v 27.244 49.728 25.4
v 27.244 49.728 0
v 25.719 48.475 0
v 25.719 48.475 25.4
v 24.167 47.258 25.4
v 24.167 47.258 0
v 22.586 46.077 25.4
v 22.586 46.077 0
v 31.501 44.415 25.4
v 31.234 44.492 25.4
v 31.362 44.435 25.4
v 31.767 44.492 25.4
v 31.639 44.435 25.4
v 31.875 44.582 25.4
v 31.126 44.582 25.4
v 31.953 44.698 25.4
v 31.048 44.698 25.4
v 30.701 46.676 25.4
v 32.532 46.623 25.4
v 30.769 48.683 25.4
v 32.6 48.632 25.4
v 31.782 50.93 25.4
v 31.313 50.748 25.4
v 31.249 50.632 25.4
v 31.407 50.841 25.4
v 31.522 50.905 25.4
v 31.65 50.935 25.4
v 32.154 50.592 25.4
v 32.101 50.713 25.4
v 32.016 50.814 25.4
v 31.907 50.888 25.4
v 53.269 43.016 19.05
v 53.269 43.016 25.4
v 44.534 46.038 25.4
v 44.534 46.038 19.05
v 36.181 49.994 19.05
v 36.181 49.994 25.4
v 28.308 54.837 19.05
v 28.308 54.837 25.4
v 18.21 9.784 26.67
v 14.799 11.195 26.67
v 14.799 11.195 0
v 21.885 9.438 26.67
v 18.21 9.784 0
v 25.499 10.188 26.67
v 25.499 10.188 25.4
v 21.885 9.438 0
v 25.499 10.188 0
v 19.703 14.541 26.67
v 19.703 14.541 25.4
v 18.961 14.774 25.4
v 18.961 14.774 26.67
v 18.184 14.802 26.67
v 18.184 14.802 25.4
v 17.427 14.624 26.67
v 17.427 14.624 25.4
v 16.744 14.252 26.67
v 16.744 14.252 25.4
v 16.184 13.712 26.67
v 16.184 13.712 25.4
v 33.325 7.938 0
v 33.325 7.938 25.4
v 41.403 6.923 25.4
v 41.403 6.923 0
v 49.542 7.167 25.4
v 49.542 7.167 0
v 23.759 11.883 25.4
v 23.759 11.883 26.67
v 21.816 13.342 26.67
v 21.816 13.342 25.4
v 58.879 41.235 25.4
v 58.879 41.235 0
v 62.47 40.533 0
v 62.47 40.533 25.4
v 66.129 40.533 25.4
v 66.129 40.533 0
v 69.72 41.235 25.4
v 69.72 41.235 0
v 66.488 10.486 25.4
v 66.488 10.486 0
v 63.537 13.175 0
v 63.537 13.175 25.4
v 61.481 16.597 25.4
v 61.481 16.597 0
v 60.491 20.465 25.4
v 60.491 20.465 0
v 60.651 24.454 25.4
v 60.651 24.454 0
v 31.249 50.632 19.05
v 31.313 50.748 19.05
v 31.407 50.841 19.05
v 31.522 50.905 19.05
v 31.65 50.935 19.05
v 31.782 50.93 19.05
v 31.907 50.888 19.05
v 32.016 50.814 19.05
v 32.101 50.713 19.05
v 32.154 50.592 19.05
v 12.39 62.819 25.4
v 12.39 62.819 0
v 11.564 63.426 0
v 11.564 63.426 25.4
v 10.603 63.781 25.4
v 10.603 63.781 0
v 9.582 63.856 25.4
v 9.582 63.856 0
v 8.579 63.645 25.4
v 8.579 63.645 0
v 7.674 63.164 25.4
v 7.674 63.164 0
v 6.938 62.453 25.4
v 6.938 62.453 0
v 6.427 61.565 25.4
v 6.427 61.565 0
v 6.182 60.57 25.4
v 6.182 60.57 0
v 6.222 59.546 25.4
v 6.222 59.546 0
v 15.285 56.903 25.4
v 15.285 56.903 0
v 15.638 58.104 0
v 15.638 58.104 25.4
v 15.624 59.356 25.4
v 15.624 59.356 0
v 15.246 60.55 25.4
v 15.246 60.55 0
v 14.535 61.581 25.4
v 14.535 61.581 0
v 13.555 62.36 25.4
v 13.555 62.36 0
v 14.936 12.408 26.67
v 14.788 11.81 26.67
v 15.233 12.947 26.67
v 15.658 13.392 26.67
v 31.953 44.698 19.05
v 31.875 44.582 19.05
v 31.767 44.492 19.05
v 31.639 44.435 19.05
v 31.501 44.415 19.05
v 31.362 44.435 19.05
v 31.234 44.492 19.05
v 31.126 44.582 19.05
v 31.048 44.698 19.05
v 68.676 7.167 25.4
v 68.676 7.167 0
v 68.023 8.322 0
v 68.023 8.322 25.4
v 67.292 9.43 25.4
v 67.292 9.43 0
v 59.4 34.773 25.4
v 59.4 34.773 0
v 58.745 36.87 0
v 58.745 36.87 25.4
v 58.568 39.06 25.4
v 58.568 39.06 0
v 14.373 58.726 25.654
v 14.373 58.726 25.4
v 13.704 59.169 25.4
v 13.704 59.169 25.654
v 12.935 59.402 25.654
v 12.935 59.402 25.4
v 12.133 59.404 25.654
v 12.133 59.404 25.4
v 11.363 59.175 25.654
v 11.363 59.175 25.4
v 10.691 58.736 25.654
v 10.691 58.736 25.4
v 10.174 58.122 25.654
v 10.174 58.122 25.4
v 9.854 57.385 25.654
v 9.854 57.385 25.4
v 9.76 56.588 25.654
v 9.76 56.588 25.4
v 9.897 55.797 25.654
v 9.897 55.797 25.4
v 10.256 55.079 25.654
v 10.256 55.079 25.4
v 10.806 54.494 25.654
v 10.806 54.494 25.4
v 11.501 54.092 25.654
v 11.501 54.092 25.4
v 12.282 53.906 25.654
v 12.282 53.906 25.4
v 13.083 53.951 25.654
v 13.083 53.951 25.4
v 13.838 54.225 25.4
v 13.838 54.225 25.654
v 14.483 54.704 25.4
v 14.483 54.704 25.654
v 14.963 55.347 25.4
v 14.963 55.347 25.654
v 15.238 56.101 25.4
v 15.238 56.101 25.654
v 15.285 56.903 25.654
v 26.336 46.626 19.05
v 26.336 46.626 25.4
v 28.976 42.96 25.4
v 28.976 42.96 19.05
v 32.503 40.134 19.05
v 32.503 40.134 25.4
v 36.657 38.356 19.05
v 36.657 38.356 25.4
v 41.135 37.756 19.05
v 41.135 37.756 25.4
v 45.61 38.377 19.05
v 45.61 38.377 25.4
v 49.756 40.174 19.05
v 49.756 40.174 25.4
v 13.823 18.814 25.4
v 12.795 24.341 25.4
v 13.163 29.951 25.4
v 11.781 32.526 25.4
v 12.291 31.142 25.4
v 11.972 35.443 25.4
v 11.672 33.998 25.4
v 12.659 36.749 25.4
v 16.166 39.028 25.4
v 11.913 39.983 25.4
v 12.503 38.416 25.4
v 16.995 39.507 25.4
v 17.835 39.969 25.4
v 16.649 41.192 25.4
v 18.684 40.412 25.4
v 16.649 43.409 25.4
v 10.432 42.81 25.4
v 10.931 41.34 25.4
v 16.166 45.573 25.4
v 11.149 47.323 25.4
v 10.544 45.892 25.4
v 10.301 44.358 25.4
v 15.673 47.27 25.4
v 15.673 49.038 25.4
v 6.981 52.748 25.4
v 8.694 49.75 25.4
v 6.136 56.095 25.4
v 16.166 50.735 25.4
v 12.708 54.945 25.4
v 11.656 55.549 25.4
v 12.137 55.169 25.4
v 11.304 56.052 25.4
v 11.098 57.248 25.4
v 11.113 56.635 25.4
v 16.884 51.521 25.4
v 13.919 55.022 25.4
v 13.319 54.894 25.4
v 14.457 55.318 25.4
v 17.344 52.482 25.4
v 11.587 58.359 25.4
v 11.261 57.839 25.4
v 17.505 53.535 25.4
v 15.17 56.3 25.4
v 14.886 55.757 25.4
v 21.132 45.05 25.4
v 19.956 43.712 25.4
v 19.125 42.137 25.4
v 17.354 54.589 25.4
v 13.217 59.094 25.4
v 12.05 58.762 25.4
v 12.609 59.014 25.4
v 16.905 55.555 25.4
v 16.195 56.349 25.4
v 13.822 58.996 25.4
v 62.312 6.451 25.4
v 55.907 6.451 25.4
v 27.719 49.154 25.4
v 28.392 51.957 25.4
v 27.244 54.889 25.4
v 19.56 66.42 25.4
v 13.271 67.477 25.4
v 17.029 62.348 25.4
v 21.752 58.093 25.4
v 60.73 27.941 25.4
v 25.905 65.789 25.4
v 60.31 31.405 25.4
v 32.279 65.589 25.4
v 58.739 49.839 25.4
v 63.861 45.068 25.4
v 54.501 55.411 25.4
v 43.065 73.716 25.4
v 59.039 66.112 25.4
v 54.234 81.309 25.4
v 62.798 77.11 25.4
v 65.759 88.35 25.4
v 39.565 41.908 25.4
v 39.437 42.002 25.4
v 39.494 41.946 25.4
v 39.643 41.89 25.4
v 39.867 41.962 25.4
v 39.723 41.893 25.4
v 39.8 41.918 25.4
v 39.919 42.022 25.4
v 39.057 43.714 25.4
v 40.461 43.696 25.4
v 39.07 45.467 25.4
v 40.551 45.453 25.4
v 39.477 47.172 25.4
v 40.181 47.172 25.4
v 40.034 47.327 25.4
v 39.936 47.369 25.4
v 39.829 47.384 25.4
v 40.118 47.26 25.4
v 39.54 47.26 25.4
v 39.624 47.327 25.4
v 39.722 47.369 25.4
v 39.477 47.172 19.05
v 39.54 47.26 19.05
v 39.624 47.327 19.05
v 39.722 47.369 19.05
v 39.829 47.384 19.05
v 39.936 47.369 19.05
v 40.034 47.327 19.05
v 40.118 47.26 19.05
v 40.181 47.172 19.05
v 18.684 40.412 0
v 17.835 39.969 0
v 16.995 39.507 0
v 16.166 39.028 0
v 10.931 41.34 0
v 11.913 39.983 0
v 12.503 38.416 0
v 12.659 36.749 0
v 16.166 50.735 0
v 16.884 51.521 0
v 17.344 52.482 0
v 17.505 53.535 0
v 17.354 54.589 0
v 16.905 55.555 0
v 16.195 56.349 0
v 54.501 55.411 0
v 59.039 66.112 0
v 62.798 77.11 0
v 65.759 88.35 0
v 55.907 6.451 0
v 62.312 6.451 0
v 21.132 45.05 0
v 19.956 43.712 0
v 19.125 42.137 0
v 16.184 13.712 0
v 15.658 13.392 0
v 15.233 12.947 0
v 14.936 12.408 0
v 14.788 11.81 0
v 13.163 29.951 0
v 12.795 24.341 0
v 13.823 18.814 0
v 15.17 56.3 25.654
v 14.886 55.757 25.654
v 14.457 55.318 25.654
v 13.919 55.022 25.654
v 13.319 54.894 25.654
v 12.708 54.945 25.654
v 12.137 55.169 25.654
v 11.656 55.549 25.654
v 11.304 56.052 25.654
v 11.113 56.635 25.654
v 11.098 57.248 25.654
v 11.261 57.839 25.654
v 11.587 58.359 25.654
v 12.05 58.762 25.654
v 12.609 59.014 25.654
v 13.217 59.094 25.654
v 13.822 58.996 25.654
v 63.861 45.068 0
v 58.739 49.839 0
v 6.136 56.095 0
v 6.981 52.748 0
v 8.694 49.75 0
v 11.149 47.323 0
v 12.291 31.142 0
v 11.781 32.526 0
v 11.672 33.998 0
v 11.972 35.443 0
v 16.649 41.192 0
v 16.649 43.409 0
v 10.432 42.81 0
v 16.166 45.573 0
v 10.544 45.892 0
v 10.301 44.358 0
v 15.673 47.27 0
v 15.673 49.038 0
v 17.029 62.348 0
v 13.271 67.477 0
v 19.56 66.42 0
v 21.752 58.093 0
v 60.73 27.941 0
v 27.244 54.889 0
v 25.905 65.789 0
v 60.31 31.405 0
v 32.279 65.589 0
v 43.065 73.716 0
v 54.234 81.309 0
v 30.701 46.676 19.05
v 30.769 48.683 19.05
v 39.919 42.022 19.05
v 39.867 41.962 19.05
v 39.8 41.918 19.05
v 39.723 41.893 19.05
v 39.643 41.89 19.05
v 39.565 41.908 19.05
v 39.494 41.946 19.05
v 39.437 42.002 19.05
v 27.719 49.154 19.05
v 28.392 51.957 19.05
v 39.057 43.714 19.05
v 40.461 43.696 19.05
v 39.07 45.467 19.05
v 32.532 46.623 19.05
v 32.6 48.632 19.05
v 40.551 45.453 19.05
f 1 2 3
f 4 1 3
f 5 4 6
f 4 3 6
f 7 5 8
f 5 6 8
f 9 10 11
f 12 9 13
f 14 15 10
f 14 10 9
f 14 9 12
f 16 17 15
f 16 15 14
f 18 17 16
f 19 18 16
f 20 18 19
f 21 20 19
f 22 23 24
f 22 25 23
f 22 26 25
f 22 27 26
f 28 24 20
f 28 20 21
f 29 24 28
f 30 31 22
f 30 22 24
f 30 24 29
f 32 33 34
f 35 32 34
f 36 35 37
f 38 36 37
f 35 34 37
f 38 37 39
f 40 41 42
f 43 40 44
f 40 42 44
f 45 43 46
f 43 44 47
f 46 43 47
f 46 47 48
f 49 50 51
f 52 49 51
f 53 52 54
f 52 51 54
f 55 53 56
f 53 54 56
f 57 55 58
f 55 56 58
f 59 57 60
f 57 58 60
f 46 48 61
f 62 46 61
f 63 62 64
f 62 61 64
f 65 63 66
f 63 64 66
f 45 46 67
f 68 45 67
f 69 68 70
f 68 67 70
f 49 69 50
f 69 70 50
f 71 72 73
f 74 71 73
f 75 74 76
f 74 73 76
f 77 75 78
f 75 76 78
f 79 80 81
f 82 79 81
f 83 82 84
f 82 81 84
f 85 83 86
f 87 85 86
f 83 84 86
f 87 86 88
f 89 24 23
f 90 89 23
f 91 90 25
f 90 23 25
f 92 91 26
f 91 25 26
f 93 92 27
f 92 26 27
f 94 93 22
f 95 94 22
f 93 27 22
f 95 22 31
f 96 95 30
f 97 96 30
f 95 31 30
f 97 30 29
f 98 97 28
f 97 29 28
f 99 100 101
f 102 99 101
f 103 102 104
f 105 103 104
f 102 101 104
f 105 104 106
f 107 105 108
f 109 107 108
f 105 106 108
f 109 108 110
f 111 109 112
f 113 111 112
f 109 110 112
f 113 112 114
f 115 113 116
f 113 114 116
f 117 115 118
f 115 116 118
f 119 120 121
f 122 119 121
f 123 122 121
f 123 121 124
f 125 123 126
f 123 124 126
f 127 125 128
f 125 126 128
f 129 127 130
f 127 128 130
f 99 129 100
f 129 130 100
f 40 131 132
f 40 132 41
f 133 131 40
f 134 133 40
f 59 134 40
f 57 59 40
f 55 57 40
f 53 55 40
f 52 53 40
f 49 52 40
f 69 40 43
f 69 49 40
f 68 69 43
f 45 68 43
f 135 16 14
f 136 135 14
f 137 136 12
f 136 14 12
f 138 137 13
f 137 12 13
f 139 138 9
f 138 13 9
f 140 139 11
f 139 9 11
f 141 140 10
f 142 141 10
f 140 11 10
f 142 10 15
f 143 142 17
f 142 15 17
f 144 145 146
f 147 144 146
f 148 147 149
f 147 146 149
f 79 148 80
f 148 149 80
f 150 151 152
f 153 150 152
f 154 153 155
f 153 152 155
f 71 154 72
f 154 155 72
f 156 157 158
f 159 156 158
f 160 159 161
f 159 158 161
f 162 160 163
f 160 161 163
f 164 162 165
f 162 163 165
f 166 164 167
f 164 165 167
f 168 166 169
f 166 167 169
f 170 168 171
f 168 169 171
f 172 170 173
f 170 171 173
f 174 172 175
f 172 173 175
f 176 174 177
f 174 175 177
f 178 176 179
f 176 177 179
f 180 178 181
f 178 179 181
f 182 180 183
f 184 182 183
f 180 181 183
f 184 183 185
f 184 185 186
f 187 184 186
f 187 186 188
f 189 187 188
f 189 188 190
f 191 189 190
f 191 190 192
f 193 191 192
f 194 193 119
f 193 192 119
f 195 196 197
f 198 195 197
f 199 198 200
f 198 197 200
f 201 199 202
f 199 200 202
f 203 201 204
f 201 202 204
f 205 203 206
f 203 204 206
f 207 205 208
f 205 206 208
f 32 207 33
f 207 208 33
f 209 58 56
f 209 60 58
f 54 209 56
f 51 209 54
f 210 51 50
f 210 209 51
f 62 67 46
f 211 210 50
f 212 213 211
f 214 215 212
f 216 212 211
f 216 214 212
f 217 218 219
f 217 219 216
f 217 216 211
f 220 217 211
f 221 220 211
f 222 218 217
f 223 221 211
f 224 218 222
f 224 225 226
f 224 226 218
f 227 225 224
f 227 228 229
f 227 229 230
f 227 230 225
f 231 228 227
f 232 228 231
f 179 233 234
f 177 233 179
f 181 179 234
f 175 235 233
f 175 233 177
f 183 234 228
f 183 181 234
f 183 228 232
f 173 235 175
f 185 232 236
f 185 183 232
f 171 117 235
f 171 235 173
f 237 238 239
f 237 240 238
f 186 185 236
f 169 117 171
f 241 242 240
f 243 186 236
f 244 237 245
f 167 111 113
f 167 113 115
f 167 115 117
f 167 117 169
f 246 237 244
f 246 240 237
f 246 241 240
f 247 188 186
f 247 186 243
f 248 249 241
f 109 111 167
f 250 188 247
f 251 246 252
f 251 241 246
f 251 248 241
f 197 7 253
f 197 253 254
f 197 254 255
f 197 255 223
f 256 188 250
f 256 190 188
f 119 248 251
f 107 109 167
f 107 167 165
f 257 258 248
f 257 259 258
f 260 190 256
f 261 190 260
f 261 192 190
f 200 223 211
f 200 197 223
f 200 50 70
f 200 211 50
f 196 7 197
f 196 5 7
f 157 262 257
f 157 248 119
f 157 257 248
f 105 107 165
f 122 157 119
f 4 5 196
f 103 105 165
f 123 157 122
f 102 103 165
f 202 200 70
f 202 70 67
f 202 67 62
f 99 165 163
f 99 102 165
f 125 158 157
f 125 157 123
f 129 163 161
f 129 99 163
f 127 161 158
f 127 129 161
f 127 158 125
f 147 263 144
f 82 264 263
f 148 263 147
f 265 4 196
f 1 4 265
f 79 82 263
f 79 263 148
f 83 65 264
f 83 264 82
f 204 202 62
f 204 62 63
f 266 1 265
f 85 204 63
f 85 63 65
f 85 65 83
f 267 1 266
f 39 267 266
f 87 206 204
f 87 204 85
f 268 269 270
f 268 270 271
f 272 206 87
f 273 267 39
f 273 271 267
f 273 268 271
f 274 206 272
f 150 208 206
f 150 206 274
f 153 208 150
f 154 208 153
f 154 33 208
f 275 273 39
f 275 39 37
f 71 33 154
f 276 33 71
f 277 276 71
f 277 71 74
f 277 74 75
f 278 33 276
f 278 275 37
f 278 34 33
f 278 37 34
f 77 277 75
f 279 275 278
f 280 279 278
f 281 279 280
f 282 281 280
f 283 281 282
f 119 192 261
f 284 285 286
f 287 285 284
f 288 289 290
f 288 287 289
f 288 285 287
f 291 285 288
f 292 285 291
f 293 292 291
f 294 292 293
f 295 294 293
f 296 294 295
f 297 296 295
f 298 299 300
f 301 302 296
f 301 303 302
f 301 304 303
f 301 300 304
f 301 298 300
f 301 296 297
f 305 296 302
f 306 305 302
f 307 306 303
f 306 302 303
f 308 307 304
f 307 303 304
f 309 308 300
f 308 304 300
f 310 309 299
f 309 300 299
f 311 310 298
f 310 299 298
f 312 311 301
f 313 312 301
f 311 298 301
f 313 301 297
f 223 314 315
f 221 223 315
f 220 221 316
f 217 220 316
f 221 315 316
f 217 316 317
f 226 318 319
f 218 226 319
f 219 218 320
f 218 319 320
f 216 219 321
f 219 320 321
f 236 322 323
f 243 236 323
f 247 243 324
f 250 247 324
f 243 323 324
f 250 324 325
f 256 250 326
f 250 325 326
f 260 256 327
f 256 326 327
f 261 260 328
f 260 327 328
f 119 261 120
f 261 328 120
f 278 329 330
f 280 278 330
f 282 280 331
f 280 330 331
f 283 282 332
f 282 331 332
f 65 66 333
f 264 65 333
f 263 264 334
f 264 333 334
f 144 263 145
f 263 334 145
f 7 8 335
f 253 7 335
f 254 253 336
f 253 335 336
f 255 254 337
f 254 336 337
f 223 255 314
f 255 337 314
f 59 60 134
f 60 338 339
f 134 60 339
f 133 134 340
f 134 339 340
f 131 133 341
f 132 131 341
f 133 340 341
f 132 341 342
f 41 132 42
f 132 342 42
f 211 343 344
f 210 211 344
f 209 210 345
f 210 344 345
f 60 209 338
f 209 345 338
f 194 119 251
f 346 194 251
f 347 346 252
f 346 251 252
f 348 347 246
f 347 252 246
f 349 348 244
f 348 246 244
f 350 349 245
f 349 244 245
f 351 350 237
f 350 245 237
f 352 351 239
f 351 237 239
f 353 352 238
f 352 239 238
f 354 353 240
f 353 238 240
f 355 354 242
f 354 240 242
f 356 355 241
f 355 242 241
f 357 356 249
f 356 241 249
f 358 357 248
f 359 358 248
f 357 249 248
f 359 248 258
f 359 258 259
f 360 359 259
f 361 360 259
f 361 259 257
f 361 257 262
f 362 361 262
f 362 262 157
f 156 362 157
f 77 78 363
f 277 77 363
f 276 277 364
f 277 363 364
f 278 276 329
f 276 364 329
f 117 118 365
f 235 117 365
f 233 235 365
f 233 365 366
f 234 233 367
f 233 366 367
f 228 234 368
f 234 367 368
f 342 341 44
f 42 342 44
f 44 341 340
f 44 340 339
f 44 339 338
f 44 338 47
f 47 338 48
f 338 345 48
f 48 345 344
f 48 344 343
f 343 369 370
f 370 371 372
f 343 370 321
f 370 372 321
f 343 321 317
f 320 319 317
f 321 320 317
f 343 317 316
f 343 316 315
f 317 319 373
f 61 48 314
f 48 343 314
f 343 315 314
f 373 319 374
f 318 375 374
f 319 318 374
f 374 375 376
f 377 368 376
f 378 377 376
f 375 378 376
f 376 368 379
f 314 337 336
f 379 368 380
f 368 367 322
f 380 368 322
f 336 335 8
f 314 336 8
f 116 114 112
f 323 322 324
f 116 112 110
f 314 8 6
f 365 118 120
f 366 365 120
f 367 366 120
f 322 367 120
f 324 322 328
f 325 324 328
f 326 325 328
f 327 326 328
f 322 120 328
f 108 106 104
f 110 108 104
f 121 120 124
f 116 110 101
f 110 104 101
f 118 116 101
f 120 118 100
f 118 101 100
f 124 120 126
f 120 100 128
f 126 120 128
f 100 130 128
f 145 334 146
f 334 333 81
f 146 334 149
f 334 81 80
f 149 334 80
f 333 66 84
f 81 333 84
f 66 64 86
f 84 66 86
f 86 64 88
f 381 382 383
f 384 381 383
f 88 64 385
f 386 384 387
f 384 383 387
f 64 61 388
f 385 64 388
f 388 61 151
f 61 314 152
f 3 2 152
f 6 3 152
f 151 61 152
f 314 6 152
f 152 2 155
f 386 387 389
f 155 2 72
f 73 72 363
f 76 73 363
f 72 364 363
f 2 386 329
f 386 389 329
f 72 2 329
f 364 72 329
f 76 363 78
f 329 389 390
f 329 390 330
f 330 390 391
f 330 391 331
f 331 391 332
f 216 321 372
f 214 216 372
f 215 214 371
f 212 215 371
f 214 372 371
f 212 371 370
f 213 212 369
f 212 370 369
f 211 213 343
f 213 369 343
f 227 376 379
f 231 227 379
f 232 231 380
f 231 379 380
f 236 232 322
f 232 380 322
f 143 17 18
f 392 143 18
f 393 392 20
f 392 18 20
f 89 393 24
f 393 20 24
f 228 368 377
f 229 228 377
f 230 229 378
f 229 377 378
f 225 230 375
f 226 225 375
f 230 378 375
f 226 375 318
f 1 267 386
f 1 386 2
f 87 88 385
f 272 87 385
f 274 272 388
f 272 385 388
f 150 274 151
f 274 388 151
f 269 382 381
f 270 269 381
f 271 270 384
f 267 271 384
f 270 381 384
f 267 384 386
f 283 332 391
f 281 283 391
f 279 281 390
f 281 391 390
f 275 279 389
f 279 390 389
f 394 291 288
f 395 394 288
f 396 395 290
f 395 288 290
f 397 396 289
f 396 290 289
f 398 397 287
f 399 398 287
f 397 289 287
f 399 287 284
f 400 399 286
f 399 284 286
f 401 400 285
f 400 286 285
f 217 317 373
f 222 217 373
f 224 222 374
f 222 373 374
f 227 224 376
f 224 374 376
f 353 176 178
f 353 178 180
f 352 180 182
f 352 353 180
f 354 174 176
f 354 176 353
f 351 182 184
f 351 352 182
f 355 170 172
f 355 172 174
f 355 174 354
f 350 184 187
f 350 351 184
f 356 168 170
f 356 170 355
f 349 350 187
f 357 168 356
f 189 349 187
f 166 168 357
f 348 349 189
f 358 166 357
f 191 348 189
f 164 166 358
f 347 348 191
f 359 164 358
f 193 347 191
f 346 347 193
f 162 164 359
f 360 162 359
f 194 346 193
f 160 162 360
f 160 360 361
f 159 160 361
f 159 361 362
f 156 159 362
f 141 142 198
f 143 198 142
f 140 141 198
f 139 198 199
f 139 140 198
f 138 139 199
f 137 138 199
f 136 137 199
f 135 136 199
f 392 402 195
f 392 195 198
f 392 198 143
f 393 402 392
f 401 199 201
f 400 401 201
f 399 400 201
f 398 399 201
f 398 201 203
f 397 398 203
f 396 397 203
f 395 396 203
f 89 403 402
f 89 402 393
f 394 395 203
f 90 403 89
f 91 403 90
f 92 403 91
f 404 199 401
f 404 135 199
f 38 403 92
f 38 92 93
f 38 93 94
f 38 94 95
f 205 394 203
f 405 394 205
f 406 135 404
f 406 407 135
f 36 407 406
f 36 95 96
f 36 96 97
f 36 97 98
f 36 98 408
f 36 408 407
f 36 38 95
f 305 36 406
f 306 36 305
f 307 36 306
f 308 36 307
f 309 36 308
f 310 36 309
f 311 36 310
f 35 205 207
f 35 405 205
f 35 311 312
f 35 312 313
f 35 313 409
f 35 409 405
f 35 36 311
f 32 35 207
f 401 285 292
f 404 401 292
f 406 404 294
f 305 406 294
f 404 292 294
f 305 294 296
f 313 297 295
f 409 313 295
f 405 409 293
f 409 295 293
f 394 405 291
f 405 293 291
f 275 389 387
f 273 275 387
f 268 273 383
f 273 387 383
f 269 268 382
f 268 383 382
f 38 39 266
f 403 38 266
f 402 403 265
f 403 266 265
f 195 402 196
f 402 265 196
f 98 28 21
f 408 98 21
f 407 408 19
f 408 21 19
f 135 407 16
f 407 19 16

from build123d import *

# Parameters (mm, degrees)
F1_DEPTH = 25.4
F3_DEPTH = 0.254
F5_DEPTH = 6.35
F7_DEPTH = 1.27


with BuildPart() as f1:
    # F0 (on Top) → F1 (new body)
    with BuildSketch(Plane.XY):
        with BuildLine():
            ThreePointArc((25.499046, 10.18772), (37.34433, 7.273723), (49.542308, 7.166576))
            ThreePointArc((49.542308, 7.166576), (59.109263, 6.361494), (68.676218, 7.166576))
            ThreePointArc((68.676218, 7.166576), (67.66707, 8.882251), (66.488296, 10.486125))
            ThreePointArc((66.488296, 10.486125), (61.480718, 16.596846), (60.651142, 24.453597))
            ThreePointArc((60.651142, 24.453597), (60.581585, 29.680598), (59.400324, 34.772847))
            ThreePointArc((59.400324, 34.772847), (58.595793, 37.960262), (58.879148, 41.23541))
            ThreePointArc((58.879148, 41.23541), (64.299362, 40.444263), (69.719575, 41.23541))
            ThreePointArc((69.719575, 41.23541), (61.198485, 47.34438), (54.501284, 55.41135))
            ThreePointArc((54.501284, 55.41135), (61.017596, 71.57709), (65.758646, 88.349566))
            ThreePointArc((65.758646, 88.349566), (48.603509, 77.579957), (32.279015, 65.588541))
            ThreePointArc((32.279015, 65.588541), (22.727137, 66.05081), (13.27099, 67.476757))
            ThreePointArc((13.27099, 67.476757), (19.281494, 60.099473), (27.243776, 54.888662))
            Line((27.243776, 54.888662), (27.243776, 49.727544))
            ThreePointArc((27.243776, 49.727544), (24.946398, 47.862182), (22.58618, 46.076994))
            ThreePointArc((22.58618, 46.076994), (19.956312, 43.712231), (18.683871, 40.412351))
            ThreePointArc((18.683871, 40.412351), (17.413772, 39.740532), (16.166251, 39.027661))
            ThreePointArc((16.166251, 39.027661), (16.709722, 42.300567), (16.166251, 45.573473))
            ThreePointArc((16.166251, 45.573473), (15.61028, 48.154032), (16.166251, 50.734591))
            ThreePointArc((16.166251, 50.734591), (17.468425, 54.06764), (15.285085, 56.902759))
            ThreePointArc((15.285085, 56.902759), (15.245628, 60.550066), (12.389823, 62.819161))
            ThreePointArc((12.389823, 62.819161), (8.109951, 63.436313), (6.221656, 59.546258))
            ThreePointArc((6.221656, 59.546258), (6.981172, 52.747617), (11.148616, 47.322601))
            ThreePointArc((11.148616, 47.322601), (10.300829, 44.357989), (10.931111, 41.339643))
            ThreePointArc((10.931111, 41.339643), (12.26077, 39.219384), (12.659186, 36.748603))
            ThreePointArc((12.659186, 36.748603), (11.67473, 33.258245), (13.162711, 29.95103))
            ThreePointArc((13.162711, 29.95103), (13.136507, 21.545797), (16.183855, 13.712387))
            ThreePointArc((16.183855, 13.712387), (15.066637, 12.687257), (14.799166, 11.194767))
            ThreePointArc((14.799166, 11.194767), (20.034555, 9.474147), (25.499046, 10.18772))
        make_face()
    extrude(amount=F1_DEPTH)

    # F2 (on face) → F3 (join)
    with BuildSketch(Plane.XY.offset(25.4)):
        with BuildLine():
            ThreePointArc((15.285085, 56.902759), (11.304381, 56.052081), (14.373336, 58.726248))
            ThreePointArc((14.373336, 58.726248), (10.050782, 55.425279), (15.285085, 56.902759))
        make_face()
    extrude(amount=F3_DEPTH)

    # F4 (on face) → F5 (cut)
    with BuildSketch(Plane.XY.offset(25.4)):
        with BuildLine():
            ThreePointArc((28.30782, 54.837245), (28.14811, 50.533264), (26.335881, 46.626144))
            ThreePointArc((26.335881, 46.626144), (38.875379, 37.904283), (53.269263, 43.01564))
            ThreePointArc((53.269263, 43.01564), (40.303335, 47.901924), (28.30782, 54.837245))
        make_face()
        with BuildLine():
            ThreePointArc((39.436687, 42.002268), (39.013767, 44.590738), (39.47692, 47.172312))
            ThreePointArc((39.47692, 47.172312), (39.828965, 47.383895), (40.181011, 47.172312))
            ThreePointArc((40.181011, 47.172312), (40.563597, 44.57128), (39.919492, 42.022385))
            ThreePointArc((39.919492, 42.022385), (39.683239, 41.888733), (39.436687, 42.002268))
        make_face(mode=Mode.SUBTRACT)
        with BuildLine():
            ThreePointArc((31.047942, 44.697933), (30.682425, 47.680975), (31.24911, 50.632417))
            ThreePointArc((31.24911, 50.632417), (31.716176, 50.937117), (32.15437, 50.592184))
            ThreePointArc((32.15437, 50.592184), (32.630986, 47.625359), (31.953201, 44.697933))
            ThreePointArc((31.953201, 44.697933), (31.500571, 44.415393), (31.047942, 44.697933))
        make_face(mode=Mode.SUBTRACT)
    extrude(amount=-F5_DEPTH, mode=Mode.SUBTRACT)

    # F6 (on face) → F7 (join)
    with BuildSketch(Plane.XY.offset(25.4)):
        with BuildLine():
            ThreePointArc((19.70306, 14.540644), (17.799455, 14.738373), (16.183855, 13.712387))
            ThreePointArc((16.183855, 13.712387), (15.066637, 12.687257), (14.799166, 11.194767))
            ThreePointArc((14.799166, 11.194767), (20.034555, 9.474147), (25.499046, 10.18772))
            ThreePointArc((25.499046, 10.18772), (22.810777, 12.643433), (19.70306, 14.540644))
        make_face()
    extrude(amount=F7_DEPTH)


solid = f1.part
